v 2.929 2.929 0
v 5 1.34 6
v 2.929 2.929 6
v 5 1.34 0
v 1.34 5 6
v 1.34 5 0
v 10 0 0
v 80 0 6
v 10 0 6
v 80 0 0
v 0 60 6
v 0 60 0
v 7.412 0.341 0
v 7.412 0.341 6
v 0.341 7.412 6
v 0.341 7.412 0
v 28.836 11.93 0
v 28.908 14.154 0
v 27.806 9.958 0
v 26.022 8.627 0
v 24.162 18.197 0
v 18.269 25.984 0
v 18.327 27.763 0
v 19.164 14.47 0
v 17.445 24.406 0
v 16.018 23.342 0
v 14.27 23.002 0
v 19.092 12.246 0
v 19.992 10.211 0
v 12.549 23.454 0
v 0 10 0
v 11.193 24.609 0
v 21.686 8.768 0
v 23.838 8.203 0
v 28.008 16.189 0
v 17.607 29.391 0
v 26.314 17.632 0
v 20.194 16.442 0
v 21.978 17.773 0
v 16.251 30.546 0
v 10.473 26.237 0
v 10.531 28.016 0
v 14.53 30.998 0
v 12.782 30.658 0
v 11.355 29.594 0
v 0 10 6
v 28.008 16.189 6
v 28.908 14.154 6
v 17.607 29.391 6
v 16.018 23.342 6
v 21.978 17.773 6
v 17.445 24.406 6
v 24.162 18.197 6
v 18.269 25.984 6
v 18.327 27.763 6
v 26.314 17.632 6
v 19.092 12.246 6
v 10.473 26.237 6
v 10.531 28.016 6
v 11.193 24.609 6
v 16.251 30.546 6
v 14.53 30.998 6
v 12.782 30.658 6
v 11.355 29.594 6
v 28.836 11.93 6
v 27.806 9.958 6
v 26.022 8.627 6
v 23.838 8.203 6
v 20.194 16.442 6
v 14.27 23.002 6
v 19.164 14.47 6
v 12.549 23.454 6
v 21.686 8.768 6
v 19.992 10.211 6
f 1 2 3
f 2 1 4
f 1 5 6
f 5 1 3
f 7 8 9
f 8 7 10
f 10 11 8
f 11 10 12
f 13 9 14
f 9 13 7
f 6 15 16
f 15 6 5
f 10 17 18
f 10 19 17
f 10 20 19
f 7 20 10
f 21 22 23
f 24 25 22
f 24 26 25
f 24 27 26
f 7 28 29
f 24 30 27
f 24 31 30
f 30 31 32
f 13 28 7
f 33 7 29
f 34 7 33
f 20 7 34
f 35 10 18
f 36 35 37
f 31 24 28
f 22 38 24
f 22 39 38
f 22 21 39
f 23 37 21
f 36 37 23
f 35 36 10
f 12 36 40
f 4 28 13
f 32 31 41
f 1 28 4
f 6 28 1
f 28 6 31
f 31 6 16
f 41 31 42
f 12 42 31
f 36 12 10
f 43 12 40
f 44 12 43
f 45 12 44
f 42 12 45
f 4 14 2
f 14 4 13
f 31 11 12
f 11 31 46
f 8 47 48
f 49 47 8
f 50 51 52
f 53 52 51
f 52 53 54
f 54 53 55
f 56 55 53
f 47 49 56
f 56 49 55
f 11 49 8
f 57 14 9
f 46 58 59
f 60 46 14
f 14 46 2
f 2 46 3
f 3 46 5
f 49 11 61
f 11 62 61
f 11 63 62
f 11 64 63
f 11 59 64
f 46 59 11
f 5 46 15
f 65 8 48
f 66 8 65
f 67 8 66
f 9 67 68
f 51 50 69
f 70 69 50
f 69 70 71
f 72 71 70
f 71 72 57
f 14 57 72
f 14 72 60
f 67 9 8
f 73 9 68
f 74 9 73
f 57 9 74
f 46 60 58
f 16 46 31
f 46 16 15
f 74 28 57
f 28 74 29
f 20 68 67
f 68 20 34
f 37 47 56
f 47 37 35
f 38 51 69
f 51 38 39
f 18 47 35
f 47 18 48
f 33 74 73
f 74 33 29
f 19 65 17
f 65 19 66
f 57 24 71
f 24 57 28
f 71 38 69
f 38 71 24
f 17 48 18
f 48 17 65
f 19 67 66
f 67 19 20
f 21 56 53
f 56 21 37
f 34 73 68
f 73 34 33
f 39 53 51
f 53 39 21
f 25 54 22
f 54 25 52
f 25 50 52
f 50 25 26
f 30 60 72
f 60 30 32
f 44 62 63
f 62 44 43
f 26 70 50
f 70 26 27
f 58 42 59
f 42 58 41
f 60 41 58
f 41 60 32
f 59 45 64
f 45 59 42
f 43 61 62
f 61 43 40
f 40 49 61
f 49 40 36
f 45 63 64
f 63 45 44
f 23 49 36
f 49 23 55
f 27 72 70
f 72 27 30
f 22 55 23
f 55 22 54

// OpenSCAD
$fn = 32;

// ----------------------------------------------------------------------
// Bracket plate: corner pad 80 x 60, fillet R10
// ----------------------------------------------------------------------

// --- parameters (mm) ---
hole_r = 4;               // bolt hole radius
plate_t = 6;              // plate thickness, Z (extrusion height)
leg_a = 80;               // base leg
leg_b = 60;               // height leg
fillet_r = 10;            // right-angle fillet radius

hole_d1 = 2 * hole_r + 2;
hole_d2 = 2 * hole_r;

profile = [[10, 0], [80, 0], [0, 60], [0, 10], [0.341, 7.412], [1.34, 5], [2.929, 2.929], [5, 1.34], [7.412, 0.341]];  // primary outline, 9 points, counter clockwise
void_1 = [[28.908, 14.154], [28.008, 16.189], [26.314, 17.632], [24.162, 18.197], [21.978, 17.773], [20.194, 16.442], [19.164, 14.47], [19.092, 12.246], [19.992, 10.211], [21.686, 8.768], [23.838, 8.203], [26.022, 8.627], [27.806, 9.958], [28.836, 11.93]];  // mount hole 1, 14 points
void_2 = [[18.327, 27.763], [17.607, 29.391], [16.251, 30.546], [14.53, 30.998], [12.782, 30.658], [11.355, 29.594], [10.531, 28.016], [10.473, 26.237], [11.193, 24.609], [12.549, 23.454], [14.27, 23.002], [16.018, 23.342], [17.445, 24.406], [18.269, 25.984]];  // mount hole 2, 14 points

// --- the one profile operation ---
difference() {
  linear_extrude(height = plate_t) polygon(points = profile);
  translate([0, 0, -1])
    linear_extrude(height = plate_t + 2) polygon(points = void_1);
  translate([0, 0, -1])
    linear_extrude(height = plate_t + 2) polygon(points = void_2);
}
